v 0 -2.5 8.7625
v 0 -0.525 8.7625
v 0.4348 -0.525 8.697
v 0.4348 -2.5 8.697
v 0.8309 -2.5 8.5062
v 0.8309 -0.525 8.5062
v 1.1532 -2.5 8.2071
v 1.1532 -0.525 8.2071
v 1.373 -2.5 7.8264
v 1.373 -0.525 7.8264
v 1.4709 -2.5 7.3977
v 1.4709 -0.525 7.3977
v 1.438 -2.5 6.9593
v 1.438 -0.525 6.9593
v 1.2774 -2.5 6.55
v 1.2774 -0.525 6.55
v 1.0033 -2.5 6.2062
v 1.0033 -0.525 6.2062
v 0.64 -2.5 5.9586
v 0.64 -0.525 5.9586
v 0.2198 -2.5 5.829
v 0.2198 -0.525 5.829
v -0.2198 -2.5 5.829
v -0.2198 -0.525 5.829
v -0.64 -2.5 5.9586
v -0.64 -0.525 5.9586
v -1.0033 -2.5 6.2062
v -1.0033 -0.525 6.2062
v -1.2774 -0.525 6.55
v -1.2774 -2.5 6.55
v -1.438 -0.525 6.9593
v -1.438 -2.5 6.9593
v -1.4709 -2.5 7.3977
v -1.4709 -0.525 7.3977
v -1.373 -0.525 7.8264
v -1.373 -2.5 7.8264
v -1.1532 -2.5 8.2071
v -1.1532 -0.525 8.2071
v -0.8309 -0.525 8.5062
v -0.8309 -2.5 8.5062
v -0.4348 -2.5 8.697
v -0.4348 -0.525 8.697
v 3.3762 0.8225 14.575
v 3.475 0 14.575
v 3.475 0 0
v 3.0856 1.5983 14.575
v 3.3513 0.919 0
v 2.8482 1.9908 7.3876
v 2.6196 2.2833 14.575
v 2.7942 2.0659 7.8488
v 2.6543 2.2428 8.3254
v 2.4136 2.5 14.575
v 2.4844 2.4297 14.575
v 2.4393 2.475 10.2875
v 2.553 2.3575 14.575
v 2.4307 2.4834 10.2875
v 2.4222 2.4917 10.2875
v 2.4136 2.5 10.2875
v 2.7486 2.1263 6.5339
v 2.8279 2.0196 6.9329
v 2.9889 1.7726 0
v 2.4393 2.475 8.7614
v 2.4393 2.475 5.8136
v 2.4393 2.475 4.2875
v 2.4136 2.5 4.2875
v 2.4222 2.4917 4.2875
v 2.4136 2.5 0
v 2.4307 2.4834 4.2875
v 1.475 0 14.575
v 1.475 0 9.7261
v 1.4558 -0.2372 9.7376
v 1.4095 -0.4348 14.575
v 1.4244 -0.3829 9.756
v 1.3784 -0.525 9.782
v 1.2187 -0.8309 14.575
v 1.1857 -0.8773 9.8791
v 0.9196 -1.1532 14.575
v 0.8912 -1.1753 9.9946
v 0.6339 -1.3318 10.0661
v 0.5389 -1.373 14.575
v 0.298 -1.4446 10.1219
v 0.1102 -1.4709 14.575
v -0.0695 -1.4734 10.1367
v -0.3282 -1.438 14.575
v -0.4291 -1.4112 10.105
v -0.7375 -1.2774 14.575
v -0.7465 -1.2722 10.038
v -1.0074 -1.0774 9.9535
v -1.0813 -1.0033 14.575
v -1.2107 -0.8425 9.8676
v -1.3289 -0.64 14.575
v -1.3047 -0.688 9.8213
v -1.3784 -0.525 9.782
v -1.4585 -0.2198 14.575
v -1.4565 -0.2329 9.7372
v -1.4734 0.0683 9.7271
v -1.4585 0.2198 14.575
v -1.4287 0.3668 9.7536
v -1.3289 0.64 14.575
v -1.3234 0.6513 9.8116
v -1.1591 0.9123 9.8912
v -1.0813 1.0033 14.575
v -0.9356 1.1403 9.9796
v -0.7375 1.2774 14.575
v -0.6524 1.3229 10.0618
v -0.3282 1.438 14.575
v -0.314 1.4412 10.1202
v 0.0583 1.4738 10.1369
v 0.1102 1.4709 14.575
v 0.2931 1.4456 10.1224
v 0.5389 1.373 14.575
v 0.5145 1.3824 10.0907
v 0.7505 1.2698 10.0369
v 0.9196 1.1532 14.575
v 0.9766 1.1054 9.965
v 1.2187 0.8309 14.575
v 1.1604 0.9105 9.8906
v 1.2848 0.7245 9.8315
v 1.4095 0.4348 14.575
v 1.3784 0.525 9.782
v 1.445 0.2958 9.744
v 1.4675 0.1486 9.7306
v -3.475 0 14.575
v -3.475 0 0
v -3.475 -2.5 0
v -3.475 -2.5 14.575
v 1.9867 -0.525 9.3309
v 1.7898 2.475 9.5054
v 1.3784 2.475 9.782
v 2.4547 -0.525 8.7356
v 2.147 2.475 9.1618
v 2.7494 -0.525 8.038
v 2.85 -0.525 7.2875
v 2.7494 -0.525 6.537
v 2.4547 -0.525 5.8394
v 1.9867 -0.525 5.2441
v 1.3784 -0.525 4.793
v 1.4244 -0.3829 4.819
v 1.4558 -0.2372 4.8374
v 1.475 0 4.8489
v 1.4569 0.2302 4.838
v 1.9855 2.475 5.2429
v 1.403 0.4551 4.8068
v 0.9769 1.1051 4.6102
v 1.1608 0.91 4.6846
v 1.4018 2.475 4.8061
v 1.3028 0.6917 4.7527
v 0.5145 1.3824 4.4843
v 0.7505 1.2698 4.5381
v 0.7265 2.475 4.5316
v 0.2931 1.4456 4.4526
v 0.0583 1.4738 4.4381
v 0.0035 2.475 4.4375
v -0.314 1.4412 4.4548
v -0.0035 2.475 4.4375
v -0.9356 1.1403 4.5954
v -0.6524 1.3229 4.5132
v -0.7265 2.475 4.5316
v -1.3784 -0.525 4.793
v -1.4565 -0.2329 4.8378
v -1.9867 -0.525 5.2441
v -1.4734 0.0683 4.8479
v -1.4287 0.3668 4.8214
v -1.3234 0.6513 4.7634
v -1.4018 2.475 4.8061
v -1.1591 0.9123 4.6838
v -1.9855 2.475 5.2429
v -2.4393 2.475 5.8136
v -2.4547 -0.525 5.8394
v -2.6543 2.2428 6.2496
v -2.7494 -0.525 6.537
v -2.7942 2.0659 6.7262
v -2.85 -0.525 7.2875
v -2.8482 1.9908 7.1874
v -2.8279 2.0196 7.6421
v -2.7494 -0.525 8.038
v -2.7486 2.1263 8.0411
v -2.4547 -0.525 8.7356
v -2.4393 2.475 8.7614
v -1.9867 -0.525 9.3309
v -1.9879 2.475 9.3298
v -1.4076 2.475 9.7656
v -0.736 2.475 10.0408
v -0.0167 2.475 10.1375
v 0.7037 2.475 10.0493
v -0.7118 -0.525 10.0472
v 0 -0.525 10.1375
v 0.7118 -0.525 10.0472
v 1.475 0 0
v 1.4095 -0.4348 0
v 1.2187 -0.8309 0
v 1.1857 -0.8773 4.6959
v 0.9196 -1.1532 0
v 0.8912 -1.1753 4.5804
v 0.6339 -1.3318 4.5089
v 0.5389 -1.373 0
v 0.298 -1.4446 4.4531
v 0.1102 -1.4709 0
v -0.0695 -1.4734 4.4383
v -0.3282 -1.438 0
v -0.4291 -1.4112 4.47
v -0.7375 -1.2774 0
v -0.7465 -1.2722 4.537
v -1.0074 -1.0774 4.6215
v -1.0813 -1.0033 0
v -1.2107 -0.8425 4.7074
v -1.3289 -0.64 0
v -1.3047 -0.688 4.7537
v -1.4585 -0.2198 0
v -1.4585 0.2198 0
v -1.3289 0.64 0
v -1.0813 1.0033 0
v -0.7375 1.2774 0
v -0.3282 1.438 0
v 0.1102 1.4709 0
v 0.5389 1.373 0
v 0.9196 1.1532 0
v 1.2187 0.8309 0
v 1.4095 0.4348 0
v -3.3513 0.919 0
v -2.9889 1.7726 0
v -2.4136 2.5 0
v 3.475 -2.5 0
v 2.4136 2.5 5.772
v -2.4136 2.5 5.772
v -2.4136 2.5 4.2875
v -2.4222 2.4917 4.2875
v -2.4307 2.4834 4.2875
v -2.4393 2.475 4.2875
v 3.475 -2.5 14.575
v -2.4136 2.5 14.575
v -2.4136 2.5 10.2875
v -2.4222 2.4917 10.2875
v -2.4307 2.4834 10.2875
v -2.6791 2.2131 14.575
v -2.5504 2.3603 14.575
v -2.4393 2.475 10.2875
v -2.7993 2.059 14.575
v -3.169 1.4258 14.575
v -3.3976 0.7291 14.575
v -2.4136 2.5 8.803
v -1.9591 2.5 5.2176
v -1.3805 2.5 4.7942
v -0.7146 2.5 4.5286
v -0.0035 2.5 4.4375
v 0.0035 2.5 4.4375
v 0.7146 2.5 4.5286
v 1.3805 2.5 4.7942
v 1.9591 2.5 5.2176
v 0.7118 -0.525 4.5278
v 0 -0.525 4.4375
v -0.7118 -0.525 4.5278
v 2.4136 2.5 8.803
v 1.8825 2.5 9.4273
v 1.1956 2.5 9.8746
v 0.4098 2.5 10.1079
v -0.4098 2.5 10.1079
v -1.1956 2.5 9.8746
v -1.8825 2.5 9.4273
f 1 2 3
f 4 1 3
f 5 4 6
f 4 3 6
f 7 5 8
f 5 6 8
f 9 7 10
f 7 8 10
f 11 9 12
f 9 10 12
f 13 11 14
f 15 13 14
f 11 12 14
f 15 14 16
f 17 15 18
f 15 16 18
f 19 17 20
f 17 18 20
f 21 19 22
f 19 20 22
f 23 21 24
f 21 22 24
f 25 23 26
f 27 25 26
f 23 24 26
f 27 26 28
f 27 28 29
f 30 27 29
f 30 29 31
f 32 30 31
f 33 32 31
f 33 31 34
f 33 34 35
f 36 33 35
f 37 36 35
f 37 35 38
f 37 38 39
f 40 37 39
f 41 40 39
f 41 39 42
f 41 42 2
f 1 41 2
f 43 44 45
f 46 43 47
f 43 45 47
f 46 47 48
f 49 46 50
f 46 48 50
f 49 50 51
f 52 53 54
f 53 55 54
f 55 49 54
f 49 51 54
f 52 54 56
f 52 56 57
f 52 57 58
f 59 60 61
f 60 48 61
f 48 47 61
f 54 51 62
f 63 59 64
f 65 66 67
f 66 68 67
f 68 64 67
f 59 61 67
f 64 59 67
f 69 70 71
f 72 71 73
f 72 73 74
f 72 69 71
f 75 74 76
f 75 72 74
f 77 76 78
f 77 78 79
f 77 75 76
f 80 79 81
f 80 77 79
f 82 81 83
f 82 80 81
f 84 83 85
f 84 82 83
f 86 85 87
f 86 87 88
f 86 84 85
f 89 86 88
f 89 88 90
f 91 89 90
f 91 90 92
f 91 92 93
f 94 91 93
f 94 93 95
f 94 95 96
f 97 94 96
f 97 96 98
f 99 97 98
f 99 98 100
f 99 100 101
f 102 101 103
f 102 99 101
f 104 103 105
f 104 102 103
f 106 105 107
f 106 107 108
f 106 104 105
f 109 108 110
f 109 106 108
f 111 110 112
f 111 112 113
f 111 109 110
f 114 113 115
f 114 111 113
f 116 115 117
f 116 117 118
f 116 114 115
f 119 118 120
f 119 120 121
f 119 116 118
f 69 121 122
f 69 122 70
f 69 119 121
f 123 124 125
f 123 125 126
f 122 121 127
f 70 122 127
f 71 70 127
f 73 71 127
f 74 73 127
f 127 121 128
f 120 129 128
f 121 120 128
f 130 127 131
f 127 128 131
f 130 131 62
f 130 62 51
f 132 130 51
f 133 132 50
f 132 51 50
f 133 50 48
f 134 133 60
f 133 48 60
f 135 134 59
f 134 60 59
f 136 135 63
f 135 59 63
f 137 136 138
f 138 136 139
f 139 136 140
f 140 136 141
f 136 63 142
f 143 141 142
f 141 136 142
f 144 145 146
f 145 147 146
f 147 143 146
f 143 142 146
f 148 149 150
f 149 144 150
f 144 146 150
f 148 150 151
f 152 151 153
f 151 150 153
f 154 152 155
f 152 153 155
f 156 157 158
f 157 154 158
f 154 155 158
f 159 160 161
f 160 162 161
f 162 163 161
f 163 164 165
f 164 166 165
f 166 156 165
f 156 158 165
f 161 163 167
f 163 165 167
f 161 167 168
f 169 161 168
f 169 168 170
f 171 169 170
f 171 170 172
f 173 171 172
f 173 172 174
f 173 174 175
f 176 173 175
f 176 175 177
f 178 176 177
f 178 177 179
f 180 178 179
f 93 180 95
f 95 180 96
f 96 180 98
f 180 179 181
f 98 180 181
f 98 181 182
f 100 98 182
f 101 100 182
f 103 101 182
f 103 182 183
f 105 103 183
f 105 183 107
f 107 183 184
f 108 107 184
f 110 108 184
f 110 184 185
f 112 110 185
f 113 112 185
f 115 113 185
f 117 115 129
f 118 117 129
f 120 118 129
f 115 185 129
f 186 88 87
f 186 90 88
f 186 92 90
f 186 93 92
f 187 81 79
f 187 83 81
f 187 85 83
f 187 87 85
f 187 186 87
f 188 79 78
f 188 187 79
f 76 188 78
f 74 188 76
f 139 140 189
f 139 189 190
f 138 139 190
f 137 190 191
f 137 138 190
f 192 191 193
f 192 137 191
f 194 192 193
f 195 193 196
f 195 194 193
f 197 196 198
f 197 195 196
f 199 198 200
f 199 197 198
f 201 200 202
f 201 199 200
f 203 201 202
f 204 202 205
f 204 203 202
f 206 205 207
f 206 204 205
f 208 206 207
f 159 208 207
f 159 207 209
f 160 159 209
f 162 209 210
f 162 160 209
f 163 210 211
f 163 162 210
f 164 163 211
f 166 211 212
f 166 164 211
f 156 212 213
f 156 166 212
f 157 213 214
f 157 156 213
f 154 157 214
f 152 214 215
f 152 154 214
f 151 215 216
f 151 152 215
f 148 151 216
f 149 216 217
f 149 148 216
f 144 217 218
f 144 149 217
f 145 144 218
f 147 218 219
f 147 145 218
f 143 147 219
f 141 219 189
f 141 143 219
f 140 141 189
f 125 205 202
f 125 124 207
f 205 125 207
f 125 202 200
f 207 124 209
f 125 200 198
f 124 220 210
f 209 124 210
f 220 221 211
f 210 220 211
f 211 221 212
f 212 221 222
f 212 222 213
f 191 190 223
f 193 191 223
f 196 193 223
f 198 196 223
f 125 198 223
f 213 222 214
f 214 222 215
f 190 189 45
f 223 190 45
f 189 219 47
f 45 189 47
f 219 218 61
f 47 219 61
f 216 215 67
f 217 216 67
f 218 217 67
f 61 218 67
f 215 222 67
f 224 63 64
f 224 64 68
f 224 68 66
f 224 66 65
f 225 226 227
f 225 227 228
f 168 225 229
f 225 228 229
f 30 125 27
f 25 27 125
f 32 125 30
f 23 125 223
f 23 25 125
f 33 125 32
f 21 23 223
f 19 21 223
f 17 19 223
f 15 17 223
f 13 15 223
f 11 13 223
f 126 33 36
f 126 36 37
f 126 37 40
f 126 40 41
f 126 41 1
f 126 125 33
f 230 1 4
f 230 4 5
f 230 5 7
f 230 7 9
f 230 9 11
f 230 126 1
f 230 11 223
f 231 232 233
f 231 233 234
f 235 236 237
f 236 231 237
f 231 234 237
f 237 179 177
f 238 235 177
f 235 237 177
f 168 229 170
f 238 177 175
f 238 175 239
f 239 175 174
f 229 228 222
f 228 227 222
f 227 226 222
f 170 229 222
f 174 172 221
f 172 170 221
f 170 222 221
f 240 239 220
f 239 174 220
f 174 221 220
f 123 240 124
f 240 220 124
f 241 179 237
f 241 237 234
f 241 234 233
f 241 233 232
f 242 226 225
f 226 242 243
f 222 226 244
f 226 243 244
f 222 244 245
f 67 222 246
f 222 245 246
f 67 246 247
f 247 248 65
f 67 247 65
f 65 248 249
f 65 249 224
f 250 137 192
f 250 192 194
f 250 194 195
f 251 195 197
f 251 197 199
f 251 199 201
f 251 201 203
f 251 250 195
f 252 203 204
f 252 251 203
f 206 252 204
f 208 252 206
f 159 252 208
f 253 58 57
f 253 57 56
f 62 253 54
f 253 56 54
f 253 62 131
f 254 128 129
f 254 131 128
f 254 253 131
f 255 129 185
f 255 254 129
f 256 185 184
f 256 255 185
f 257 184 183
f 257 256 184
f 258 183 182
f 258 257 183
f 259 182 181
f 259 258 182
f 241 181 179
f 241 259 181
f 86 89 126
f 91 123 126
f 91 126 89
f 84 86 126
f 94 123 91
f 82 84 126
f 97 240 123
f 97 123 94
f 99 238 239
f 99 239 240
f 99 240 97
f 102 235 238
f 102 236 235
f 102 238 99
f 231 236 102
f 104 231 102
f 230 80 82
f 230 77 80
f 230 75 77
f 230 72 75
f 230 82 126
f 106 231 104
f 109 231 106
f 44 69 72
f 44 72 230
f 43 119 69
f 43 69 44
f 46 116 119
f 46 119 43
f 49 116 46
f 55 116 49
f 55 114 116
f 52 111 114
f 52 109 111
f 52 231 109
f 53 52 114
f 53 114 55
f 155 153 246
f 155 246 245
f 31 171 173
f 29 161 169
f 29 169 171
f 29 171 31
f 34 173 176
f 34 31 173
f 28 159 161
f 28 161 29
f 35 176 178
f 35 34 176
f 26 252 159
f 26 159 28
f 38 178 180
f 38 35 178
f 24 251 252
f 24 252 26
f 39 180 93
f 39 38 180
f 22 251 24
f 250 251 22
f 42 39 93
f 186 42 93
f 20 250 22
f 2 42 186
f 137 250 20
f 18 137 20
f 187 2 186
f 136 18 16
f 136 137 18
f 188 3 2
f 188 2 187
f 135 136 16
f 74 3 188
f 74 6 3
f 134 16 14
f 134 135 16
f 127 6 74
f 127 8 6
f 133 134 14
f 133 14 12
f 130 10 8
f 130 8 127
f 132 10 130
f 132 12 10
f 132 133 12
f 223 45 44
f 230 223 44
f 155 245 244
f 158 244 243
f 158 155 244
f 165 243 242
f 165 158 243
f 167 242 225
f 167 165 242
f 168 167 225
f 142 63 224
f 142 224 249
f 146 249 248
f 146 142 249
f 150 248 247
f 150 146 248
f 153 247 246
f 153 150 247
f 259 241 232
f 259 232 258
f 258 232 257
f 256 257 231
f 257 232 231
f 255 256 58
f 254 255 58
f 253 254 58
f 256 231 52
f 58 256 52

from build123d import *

# Parameters (mm, degrees)
SKETCH2_R             = 3.475
BOSS_EXTRUDE2_DEPTH   = 14.575
SKETCH3_R             = 1.475
CUT_EXTRUDE1_DEPTH    = 10
CUT_EXTRUDE2_START    = -10
SKETCH4_R             = 1.475
CUT_EXTRUDE2_DEPTH    = 10
BOSS_EXTRUDE3_DEPTH   = 14.575
SKETCH6_W             = 6.95
SKETCH6_H             = 14.575
BOSS_EXTRUDE4_DEPTH   = 0.2
SKETCH8_W             = 6
SKETCH8_H             = 2
CUT_EXTRUDE3_DEPTH    = 17.560155
SKETCH10_R            = 2.85
CUT_EXTRUDE4_DEPTH    = 3
SKETCH11_R            = 1.675
CUT_EXTRUDE5_DEPTH    = 16.508264
SKETCH17_R            = 2.85
BOSS_EXTRUDE8_DEPTH   = 3.15
BOSS_EXTRUDE9_DEPTH   = 0.150002
BOSS_EXTRUDE9_START   = 4.437502
BOSS_EXTRUDE9_2_DEPTH = 1.376058
BOSS_EXTRUDE9_START_2 = 2.475
BOSS_EXTRUDE9_3_DEPTH = 1.525
BOSS_EXTRUDE12_START  = 4
BOSS_EXTRUDE12_DEPTH  = 4
CUT_EXTRUDE6_DEPTH    = 17.322741
SKETCH23_R            = 1.475
CUT_EXTRUDE8_DEPTH    = 16.508264
SKETCH24_W            = 6.95
SKETCH24_H            = 1.175
CUT_EXTRUDE9_DEPTH    = 16.427634


with BuildPart() as part:
    # Sketch2 → Boss-Extrude2 (new body)
    with BuildSketch(Plane.XY):
        Circle(SKETCH2_R)
    extrude(amount=BOSS_EXTRUDE2_DEPTH)

    # Sketch3 → Cut-Extrude1 (cut)
    with BuildSketch(Plane.XY.offset(14.575)):
        Circle(SKETCH3_R)
    extrude(amount=-CUT_EXTRUDE1_DEPTH, mode=Mode.SUBTRACT)

    # Sketch4 → Cut-Extrude2 (cut)
    with BuildSketch(Plane(origin=(0, 0, 0), x_dir=(-1, 0, 0), z_dir=(0, 0, -1)).offset(CUT_EXTRUDE2_START)):
        with Locations(Location((0, 0, 0), (0, 0, 180))):
            Circle(SKETCH4_R)
    extrude(amount=CUT_EXTRUDE2_DEPTH, mode=Mode.SUBTRACT)

    # Sketch5 → Boss-Extrude3 (add)
    with BuildSketch(Plane(origin=(0, 0, 0), x_dir=(-1, 0, 0), z_dir=(0, 0, -1))):
        with BuildLine():
            ThreePointArc((0, -3.475), (-2.457196, -2.457196), (-3.475, 0))
            Line((-3.475, 0), (-3.475, -3.475))
            Line((-3.475, -3.475), (0, -3.475))
        make_face()
        with BuildLine():
            Line((3.475, -3.475), (3.475, 0))
            ThreePointArc((3.475, 0), (2.457196, -2.457196), (0, -3.475))
            Line((0, -3.475), (3.475, -3.475))
        make_face()
    extrude(amount=-BOSS_EXTRUDE3_DEPTH)

    # Sketch6 → Boss-Extrude4 (add)
    with BuildSketch(Plane.XZ.offset(3.475)):
        with Locations((0, 7.2875)):
            Rectangle(SKETCH6_W, SKETCH6_H)
    extrude(amount=BOSS_EXTRUDE4_DEPTH)

    # Sketch8 → Cut-Extrude3 (cut, through all)
    with BuildSketch(Plane.ZY.offset(3.475)):
        with Locations((7.2875, 3.475)):
            Rectangle(SKETCH8_W, SKETCH8_H)
    extrude(amount=-CUT_EXTRUDE3_DEPTH, mode=Mode.SUBTRACT)

    # Sketch10 → Cut-Extrude4 (cut)
    with BuildSketch(Plane(origin=(0, 2.475, 0), x_dir=(1, 0, 0), z_dir=(0, 1, 0))):
        with Locations(Location((0, -7.2875, 0), (0, 0, 298.924116))):
            Circle(SKETCH10_R)
    extrude(amount=-CUT_EXTRUDE4_DEPTH, mode=Mode.SUBTRACT)

    # Sketch11 → Cut-Extrude5 (cut, through all)
    with BuildSketch(Plane(origin=(0, -0.525, 0), x_dir=(1, 0, 0), z_dir=(0, 1, 0))):
        with Locations(Location((0, -7.2875, 0), (0, 0, 270))):
            Circle(SKETCH11_R)
    extrude(amount=-CUT_EXTRUDE5_DEPTH, mode=Mode.SUBTRACT)

    # Sketch17 → Boss-Extrude8 (add)
    with BuildSketch(Plane(origin=(0, -0.525, 0), x_dir=(1, 0, 0), z_dir=(0, 1, 0))):
        with Locations(Location((0, -7.2875, 0), (0, 0, 298.924116))):
            Circle(SKETCH17_R)
    extrude(amount=-BOSS_EXTRUDE8_DEPTH)

    # Boss-Extrude9: read off the stored shape, not the designer's step
    # Boss-Extrude9 outline → Boss-Extrude9 (add)
    with BuildSketch(Plane.XY.offset(4.2875)):
        with BuildLine():
            ThreePointArc((2.439262, 2.475), (0, 3.475), (-2.439262, 2.475))
            Line((-2.439262, 2.475), (2.439262, 2.475))
        make_face()
    extrude(amount=BOSS_EXTRUDE9_DEPTH)

    # Boss-Extrude9 2 outline → Boss-Extrude9 2 (add)
    with BuildSketch(Plane.XY.offset(BOSS_EXTRUDE9_START)):
        with BuildLine():
            ThreePointArc((2.439262, 2.475), (0, 3.475), (-2.439262, 2.475))
            Line((-2.439262, 2.475), (2.439262, 2.475))
        make_face()
    extrude(amount=BOSS_EXTRUDE9_2_DEPTH)

    # Boss-Extrude9 3 outline → Boss-Extrude9 3 (cut)
    with BuildSketch(Plane(origin=(0, 0, 0), x_dir=(1, 0, 0), z_dir=(0, 1, 0)).offset(BOSS_EXTRUDE9_START_2)):
        with BuildLine():
            ThreePointArc((-0.003518, -4.437502), (-1.401848, -4.806105), (-2.439262, -5.81356))
            Line((-2.439262, -5.81356), (2.439262, -5.81356))
            ThreePointArc((2.439262, -5.81356), (1.401848, -4.806105), (0.003518, -4.437502))
            Line((0.003518, -4.437502), (-0.003518, -4.437502))
        make_face()
    extrude(amount=BOSS_EXTRUDE9_3_DEPTH, mode=Mode.SUBTRACT)

    # Sketch20 → Boss-Extrude12 (add)
    with BuildSketch(Plane(origin=(0, 2.475, 0), x_dir=(1, 0, 0), z_dir=(0, 1, 0)).offset(BOSS_EXTRUDE12_START)):
        with BuildLine():
            Line((-2.439262, -10.2875), (2.439262, -10.2875))
            Line((2.439262, -10.2875), (2.439262, -8.76144))
            ThreePointArc((2.439262, -8.76144), (0, -10.1375), (-2.439262, -8.76144))
            Line((-2.439262, -8.76144), (-2.439262, -10.2875))
        make_face()
    extrude(amount=-BOSS_EXTRUDE12_DEPTH)

    # Sketch21 → Cut-Extrude6 (cut, through all)
    with BuildSketch(Plane.XY.offset(14.575)):
        with BuildLine():
            Line((-2.995994, 6.810074), (-2.799337, 2.058965))
            ThreePointArc((-2.799337, 2.058965), (-0.143714, 3.472027), (2.619604, 2.283265))
            Line((2.619604, 2.283265), (3.825654, 6.913781))
            Line((3.825654, 6.913781), (-2.995994, 6.810074))
        make_face()
    extrude(amount=-CUT_EXTRUDE6_DEPTH, mode=Mode.SUBTRACT)

    # Sketch23 → Cut-Extrude8 (cut, through all)
    with BuildSketch(Plane(origin=(0, -0.525, 0), x_dir=(1, 0, 0), z_dir=(0, 1, 0))):
        with Locations(Location((0, -7.2875, 0), (0, 0, 270))):
            Circle(SKETCH23_R)
    extrude(amount=-CUT_EXTRUDE8_DEPTH, mode=Mode.SUBTRACT)

    # Sketch24 → Cut-Extrude9 (cut, through all)
    with BuildSketch(Plane.XY.offset(14.575)):
        with BuildLine():
            ThreePointArc((2.413633, 2.5), (0, 3.475), (-2.413633, 2.5))
            Line((-2.413633, 2.5), (2.413633, 2.5))
        make_face()
        with Locations((0, -3.0875)):
            Rectangle(SKETCH24_W, SKETCH24_H)
    extrude(amount=-CUT_EXTRUDE9_DEPTH, mode=Mode.SUBTRACT)


solid = part.part
